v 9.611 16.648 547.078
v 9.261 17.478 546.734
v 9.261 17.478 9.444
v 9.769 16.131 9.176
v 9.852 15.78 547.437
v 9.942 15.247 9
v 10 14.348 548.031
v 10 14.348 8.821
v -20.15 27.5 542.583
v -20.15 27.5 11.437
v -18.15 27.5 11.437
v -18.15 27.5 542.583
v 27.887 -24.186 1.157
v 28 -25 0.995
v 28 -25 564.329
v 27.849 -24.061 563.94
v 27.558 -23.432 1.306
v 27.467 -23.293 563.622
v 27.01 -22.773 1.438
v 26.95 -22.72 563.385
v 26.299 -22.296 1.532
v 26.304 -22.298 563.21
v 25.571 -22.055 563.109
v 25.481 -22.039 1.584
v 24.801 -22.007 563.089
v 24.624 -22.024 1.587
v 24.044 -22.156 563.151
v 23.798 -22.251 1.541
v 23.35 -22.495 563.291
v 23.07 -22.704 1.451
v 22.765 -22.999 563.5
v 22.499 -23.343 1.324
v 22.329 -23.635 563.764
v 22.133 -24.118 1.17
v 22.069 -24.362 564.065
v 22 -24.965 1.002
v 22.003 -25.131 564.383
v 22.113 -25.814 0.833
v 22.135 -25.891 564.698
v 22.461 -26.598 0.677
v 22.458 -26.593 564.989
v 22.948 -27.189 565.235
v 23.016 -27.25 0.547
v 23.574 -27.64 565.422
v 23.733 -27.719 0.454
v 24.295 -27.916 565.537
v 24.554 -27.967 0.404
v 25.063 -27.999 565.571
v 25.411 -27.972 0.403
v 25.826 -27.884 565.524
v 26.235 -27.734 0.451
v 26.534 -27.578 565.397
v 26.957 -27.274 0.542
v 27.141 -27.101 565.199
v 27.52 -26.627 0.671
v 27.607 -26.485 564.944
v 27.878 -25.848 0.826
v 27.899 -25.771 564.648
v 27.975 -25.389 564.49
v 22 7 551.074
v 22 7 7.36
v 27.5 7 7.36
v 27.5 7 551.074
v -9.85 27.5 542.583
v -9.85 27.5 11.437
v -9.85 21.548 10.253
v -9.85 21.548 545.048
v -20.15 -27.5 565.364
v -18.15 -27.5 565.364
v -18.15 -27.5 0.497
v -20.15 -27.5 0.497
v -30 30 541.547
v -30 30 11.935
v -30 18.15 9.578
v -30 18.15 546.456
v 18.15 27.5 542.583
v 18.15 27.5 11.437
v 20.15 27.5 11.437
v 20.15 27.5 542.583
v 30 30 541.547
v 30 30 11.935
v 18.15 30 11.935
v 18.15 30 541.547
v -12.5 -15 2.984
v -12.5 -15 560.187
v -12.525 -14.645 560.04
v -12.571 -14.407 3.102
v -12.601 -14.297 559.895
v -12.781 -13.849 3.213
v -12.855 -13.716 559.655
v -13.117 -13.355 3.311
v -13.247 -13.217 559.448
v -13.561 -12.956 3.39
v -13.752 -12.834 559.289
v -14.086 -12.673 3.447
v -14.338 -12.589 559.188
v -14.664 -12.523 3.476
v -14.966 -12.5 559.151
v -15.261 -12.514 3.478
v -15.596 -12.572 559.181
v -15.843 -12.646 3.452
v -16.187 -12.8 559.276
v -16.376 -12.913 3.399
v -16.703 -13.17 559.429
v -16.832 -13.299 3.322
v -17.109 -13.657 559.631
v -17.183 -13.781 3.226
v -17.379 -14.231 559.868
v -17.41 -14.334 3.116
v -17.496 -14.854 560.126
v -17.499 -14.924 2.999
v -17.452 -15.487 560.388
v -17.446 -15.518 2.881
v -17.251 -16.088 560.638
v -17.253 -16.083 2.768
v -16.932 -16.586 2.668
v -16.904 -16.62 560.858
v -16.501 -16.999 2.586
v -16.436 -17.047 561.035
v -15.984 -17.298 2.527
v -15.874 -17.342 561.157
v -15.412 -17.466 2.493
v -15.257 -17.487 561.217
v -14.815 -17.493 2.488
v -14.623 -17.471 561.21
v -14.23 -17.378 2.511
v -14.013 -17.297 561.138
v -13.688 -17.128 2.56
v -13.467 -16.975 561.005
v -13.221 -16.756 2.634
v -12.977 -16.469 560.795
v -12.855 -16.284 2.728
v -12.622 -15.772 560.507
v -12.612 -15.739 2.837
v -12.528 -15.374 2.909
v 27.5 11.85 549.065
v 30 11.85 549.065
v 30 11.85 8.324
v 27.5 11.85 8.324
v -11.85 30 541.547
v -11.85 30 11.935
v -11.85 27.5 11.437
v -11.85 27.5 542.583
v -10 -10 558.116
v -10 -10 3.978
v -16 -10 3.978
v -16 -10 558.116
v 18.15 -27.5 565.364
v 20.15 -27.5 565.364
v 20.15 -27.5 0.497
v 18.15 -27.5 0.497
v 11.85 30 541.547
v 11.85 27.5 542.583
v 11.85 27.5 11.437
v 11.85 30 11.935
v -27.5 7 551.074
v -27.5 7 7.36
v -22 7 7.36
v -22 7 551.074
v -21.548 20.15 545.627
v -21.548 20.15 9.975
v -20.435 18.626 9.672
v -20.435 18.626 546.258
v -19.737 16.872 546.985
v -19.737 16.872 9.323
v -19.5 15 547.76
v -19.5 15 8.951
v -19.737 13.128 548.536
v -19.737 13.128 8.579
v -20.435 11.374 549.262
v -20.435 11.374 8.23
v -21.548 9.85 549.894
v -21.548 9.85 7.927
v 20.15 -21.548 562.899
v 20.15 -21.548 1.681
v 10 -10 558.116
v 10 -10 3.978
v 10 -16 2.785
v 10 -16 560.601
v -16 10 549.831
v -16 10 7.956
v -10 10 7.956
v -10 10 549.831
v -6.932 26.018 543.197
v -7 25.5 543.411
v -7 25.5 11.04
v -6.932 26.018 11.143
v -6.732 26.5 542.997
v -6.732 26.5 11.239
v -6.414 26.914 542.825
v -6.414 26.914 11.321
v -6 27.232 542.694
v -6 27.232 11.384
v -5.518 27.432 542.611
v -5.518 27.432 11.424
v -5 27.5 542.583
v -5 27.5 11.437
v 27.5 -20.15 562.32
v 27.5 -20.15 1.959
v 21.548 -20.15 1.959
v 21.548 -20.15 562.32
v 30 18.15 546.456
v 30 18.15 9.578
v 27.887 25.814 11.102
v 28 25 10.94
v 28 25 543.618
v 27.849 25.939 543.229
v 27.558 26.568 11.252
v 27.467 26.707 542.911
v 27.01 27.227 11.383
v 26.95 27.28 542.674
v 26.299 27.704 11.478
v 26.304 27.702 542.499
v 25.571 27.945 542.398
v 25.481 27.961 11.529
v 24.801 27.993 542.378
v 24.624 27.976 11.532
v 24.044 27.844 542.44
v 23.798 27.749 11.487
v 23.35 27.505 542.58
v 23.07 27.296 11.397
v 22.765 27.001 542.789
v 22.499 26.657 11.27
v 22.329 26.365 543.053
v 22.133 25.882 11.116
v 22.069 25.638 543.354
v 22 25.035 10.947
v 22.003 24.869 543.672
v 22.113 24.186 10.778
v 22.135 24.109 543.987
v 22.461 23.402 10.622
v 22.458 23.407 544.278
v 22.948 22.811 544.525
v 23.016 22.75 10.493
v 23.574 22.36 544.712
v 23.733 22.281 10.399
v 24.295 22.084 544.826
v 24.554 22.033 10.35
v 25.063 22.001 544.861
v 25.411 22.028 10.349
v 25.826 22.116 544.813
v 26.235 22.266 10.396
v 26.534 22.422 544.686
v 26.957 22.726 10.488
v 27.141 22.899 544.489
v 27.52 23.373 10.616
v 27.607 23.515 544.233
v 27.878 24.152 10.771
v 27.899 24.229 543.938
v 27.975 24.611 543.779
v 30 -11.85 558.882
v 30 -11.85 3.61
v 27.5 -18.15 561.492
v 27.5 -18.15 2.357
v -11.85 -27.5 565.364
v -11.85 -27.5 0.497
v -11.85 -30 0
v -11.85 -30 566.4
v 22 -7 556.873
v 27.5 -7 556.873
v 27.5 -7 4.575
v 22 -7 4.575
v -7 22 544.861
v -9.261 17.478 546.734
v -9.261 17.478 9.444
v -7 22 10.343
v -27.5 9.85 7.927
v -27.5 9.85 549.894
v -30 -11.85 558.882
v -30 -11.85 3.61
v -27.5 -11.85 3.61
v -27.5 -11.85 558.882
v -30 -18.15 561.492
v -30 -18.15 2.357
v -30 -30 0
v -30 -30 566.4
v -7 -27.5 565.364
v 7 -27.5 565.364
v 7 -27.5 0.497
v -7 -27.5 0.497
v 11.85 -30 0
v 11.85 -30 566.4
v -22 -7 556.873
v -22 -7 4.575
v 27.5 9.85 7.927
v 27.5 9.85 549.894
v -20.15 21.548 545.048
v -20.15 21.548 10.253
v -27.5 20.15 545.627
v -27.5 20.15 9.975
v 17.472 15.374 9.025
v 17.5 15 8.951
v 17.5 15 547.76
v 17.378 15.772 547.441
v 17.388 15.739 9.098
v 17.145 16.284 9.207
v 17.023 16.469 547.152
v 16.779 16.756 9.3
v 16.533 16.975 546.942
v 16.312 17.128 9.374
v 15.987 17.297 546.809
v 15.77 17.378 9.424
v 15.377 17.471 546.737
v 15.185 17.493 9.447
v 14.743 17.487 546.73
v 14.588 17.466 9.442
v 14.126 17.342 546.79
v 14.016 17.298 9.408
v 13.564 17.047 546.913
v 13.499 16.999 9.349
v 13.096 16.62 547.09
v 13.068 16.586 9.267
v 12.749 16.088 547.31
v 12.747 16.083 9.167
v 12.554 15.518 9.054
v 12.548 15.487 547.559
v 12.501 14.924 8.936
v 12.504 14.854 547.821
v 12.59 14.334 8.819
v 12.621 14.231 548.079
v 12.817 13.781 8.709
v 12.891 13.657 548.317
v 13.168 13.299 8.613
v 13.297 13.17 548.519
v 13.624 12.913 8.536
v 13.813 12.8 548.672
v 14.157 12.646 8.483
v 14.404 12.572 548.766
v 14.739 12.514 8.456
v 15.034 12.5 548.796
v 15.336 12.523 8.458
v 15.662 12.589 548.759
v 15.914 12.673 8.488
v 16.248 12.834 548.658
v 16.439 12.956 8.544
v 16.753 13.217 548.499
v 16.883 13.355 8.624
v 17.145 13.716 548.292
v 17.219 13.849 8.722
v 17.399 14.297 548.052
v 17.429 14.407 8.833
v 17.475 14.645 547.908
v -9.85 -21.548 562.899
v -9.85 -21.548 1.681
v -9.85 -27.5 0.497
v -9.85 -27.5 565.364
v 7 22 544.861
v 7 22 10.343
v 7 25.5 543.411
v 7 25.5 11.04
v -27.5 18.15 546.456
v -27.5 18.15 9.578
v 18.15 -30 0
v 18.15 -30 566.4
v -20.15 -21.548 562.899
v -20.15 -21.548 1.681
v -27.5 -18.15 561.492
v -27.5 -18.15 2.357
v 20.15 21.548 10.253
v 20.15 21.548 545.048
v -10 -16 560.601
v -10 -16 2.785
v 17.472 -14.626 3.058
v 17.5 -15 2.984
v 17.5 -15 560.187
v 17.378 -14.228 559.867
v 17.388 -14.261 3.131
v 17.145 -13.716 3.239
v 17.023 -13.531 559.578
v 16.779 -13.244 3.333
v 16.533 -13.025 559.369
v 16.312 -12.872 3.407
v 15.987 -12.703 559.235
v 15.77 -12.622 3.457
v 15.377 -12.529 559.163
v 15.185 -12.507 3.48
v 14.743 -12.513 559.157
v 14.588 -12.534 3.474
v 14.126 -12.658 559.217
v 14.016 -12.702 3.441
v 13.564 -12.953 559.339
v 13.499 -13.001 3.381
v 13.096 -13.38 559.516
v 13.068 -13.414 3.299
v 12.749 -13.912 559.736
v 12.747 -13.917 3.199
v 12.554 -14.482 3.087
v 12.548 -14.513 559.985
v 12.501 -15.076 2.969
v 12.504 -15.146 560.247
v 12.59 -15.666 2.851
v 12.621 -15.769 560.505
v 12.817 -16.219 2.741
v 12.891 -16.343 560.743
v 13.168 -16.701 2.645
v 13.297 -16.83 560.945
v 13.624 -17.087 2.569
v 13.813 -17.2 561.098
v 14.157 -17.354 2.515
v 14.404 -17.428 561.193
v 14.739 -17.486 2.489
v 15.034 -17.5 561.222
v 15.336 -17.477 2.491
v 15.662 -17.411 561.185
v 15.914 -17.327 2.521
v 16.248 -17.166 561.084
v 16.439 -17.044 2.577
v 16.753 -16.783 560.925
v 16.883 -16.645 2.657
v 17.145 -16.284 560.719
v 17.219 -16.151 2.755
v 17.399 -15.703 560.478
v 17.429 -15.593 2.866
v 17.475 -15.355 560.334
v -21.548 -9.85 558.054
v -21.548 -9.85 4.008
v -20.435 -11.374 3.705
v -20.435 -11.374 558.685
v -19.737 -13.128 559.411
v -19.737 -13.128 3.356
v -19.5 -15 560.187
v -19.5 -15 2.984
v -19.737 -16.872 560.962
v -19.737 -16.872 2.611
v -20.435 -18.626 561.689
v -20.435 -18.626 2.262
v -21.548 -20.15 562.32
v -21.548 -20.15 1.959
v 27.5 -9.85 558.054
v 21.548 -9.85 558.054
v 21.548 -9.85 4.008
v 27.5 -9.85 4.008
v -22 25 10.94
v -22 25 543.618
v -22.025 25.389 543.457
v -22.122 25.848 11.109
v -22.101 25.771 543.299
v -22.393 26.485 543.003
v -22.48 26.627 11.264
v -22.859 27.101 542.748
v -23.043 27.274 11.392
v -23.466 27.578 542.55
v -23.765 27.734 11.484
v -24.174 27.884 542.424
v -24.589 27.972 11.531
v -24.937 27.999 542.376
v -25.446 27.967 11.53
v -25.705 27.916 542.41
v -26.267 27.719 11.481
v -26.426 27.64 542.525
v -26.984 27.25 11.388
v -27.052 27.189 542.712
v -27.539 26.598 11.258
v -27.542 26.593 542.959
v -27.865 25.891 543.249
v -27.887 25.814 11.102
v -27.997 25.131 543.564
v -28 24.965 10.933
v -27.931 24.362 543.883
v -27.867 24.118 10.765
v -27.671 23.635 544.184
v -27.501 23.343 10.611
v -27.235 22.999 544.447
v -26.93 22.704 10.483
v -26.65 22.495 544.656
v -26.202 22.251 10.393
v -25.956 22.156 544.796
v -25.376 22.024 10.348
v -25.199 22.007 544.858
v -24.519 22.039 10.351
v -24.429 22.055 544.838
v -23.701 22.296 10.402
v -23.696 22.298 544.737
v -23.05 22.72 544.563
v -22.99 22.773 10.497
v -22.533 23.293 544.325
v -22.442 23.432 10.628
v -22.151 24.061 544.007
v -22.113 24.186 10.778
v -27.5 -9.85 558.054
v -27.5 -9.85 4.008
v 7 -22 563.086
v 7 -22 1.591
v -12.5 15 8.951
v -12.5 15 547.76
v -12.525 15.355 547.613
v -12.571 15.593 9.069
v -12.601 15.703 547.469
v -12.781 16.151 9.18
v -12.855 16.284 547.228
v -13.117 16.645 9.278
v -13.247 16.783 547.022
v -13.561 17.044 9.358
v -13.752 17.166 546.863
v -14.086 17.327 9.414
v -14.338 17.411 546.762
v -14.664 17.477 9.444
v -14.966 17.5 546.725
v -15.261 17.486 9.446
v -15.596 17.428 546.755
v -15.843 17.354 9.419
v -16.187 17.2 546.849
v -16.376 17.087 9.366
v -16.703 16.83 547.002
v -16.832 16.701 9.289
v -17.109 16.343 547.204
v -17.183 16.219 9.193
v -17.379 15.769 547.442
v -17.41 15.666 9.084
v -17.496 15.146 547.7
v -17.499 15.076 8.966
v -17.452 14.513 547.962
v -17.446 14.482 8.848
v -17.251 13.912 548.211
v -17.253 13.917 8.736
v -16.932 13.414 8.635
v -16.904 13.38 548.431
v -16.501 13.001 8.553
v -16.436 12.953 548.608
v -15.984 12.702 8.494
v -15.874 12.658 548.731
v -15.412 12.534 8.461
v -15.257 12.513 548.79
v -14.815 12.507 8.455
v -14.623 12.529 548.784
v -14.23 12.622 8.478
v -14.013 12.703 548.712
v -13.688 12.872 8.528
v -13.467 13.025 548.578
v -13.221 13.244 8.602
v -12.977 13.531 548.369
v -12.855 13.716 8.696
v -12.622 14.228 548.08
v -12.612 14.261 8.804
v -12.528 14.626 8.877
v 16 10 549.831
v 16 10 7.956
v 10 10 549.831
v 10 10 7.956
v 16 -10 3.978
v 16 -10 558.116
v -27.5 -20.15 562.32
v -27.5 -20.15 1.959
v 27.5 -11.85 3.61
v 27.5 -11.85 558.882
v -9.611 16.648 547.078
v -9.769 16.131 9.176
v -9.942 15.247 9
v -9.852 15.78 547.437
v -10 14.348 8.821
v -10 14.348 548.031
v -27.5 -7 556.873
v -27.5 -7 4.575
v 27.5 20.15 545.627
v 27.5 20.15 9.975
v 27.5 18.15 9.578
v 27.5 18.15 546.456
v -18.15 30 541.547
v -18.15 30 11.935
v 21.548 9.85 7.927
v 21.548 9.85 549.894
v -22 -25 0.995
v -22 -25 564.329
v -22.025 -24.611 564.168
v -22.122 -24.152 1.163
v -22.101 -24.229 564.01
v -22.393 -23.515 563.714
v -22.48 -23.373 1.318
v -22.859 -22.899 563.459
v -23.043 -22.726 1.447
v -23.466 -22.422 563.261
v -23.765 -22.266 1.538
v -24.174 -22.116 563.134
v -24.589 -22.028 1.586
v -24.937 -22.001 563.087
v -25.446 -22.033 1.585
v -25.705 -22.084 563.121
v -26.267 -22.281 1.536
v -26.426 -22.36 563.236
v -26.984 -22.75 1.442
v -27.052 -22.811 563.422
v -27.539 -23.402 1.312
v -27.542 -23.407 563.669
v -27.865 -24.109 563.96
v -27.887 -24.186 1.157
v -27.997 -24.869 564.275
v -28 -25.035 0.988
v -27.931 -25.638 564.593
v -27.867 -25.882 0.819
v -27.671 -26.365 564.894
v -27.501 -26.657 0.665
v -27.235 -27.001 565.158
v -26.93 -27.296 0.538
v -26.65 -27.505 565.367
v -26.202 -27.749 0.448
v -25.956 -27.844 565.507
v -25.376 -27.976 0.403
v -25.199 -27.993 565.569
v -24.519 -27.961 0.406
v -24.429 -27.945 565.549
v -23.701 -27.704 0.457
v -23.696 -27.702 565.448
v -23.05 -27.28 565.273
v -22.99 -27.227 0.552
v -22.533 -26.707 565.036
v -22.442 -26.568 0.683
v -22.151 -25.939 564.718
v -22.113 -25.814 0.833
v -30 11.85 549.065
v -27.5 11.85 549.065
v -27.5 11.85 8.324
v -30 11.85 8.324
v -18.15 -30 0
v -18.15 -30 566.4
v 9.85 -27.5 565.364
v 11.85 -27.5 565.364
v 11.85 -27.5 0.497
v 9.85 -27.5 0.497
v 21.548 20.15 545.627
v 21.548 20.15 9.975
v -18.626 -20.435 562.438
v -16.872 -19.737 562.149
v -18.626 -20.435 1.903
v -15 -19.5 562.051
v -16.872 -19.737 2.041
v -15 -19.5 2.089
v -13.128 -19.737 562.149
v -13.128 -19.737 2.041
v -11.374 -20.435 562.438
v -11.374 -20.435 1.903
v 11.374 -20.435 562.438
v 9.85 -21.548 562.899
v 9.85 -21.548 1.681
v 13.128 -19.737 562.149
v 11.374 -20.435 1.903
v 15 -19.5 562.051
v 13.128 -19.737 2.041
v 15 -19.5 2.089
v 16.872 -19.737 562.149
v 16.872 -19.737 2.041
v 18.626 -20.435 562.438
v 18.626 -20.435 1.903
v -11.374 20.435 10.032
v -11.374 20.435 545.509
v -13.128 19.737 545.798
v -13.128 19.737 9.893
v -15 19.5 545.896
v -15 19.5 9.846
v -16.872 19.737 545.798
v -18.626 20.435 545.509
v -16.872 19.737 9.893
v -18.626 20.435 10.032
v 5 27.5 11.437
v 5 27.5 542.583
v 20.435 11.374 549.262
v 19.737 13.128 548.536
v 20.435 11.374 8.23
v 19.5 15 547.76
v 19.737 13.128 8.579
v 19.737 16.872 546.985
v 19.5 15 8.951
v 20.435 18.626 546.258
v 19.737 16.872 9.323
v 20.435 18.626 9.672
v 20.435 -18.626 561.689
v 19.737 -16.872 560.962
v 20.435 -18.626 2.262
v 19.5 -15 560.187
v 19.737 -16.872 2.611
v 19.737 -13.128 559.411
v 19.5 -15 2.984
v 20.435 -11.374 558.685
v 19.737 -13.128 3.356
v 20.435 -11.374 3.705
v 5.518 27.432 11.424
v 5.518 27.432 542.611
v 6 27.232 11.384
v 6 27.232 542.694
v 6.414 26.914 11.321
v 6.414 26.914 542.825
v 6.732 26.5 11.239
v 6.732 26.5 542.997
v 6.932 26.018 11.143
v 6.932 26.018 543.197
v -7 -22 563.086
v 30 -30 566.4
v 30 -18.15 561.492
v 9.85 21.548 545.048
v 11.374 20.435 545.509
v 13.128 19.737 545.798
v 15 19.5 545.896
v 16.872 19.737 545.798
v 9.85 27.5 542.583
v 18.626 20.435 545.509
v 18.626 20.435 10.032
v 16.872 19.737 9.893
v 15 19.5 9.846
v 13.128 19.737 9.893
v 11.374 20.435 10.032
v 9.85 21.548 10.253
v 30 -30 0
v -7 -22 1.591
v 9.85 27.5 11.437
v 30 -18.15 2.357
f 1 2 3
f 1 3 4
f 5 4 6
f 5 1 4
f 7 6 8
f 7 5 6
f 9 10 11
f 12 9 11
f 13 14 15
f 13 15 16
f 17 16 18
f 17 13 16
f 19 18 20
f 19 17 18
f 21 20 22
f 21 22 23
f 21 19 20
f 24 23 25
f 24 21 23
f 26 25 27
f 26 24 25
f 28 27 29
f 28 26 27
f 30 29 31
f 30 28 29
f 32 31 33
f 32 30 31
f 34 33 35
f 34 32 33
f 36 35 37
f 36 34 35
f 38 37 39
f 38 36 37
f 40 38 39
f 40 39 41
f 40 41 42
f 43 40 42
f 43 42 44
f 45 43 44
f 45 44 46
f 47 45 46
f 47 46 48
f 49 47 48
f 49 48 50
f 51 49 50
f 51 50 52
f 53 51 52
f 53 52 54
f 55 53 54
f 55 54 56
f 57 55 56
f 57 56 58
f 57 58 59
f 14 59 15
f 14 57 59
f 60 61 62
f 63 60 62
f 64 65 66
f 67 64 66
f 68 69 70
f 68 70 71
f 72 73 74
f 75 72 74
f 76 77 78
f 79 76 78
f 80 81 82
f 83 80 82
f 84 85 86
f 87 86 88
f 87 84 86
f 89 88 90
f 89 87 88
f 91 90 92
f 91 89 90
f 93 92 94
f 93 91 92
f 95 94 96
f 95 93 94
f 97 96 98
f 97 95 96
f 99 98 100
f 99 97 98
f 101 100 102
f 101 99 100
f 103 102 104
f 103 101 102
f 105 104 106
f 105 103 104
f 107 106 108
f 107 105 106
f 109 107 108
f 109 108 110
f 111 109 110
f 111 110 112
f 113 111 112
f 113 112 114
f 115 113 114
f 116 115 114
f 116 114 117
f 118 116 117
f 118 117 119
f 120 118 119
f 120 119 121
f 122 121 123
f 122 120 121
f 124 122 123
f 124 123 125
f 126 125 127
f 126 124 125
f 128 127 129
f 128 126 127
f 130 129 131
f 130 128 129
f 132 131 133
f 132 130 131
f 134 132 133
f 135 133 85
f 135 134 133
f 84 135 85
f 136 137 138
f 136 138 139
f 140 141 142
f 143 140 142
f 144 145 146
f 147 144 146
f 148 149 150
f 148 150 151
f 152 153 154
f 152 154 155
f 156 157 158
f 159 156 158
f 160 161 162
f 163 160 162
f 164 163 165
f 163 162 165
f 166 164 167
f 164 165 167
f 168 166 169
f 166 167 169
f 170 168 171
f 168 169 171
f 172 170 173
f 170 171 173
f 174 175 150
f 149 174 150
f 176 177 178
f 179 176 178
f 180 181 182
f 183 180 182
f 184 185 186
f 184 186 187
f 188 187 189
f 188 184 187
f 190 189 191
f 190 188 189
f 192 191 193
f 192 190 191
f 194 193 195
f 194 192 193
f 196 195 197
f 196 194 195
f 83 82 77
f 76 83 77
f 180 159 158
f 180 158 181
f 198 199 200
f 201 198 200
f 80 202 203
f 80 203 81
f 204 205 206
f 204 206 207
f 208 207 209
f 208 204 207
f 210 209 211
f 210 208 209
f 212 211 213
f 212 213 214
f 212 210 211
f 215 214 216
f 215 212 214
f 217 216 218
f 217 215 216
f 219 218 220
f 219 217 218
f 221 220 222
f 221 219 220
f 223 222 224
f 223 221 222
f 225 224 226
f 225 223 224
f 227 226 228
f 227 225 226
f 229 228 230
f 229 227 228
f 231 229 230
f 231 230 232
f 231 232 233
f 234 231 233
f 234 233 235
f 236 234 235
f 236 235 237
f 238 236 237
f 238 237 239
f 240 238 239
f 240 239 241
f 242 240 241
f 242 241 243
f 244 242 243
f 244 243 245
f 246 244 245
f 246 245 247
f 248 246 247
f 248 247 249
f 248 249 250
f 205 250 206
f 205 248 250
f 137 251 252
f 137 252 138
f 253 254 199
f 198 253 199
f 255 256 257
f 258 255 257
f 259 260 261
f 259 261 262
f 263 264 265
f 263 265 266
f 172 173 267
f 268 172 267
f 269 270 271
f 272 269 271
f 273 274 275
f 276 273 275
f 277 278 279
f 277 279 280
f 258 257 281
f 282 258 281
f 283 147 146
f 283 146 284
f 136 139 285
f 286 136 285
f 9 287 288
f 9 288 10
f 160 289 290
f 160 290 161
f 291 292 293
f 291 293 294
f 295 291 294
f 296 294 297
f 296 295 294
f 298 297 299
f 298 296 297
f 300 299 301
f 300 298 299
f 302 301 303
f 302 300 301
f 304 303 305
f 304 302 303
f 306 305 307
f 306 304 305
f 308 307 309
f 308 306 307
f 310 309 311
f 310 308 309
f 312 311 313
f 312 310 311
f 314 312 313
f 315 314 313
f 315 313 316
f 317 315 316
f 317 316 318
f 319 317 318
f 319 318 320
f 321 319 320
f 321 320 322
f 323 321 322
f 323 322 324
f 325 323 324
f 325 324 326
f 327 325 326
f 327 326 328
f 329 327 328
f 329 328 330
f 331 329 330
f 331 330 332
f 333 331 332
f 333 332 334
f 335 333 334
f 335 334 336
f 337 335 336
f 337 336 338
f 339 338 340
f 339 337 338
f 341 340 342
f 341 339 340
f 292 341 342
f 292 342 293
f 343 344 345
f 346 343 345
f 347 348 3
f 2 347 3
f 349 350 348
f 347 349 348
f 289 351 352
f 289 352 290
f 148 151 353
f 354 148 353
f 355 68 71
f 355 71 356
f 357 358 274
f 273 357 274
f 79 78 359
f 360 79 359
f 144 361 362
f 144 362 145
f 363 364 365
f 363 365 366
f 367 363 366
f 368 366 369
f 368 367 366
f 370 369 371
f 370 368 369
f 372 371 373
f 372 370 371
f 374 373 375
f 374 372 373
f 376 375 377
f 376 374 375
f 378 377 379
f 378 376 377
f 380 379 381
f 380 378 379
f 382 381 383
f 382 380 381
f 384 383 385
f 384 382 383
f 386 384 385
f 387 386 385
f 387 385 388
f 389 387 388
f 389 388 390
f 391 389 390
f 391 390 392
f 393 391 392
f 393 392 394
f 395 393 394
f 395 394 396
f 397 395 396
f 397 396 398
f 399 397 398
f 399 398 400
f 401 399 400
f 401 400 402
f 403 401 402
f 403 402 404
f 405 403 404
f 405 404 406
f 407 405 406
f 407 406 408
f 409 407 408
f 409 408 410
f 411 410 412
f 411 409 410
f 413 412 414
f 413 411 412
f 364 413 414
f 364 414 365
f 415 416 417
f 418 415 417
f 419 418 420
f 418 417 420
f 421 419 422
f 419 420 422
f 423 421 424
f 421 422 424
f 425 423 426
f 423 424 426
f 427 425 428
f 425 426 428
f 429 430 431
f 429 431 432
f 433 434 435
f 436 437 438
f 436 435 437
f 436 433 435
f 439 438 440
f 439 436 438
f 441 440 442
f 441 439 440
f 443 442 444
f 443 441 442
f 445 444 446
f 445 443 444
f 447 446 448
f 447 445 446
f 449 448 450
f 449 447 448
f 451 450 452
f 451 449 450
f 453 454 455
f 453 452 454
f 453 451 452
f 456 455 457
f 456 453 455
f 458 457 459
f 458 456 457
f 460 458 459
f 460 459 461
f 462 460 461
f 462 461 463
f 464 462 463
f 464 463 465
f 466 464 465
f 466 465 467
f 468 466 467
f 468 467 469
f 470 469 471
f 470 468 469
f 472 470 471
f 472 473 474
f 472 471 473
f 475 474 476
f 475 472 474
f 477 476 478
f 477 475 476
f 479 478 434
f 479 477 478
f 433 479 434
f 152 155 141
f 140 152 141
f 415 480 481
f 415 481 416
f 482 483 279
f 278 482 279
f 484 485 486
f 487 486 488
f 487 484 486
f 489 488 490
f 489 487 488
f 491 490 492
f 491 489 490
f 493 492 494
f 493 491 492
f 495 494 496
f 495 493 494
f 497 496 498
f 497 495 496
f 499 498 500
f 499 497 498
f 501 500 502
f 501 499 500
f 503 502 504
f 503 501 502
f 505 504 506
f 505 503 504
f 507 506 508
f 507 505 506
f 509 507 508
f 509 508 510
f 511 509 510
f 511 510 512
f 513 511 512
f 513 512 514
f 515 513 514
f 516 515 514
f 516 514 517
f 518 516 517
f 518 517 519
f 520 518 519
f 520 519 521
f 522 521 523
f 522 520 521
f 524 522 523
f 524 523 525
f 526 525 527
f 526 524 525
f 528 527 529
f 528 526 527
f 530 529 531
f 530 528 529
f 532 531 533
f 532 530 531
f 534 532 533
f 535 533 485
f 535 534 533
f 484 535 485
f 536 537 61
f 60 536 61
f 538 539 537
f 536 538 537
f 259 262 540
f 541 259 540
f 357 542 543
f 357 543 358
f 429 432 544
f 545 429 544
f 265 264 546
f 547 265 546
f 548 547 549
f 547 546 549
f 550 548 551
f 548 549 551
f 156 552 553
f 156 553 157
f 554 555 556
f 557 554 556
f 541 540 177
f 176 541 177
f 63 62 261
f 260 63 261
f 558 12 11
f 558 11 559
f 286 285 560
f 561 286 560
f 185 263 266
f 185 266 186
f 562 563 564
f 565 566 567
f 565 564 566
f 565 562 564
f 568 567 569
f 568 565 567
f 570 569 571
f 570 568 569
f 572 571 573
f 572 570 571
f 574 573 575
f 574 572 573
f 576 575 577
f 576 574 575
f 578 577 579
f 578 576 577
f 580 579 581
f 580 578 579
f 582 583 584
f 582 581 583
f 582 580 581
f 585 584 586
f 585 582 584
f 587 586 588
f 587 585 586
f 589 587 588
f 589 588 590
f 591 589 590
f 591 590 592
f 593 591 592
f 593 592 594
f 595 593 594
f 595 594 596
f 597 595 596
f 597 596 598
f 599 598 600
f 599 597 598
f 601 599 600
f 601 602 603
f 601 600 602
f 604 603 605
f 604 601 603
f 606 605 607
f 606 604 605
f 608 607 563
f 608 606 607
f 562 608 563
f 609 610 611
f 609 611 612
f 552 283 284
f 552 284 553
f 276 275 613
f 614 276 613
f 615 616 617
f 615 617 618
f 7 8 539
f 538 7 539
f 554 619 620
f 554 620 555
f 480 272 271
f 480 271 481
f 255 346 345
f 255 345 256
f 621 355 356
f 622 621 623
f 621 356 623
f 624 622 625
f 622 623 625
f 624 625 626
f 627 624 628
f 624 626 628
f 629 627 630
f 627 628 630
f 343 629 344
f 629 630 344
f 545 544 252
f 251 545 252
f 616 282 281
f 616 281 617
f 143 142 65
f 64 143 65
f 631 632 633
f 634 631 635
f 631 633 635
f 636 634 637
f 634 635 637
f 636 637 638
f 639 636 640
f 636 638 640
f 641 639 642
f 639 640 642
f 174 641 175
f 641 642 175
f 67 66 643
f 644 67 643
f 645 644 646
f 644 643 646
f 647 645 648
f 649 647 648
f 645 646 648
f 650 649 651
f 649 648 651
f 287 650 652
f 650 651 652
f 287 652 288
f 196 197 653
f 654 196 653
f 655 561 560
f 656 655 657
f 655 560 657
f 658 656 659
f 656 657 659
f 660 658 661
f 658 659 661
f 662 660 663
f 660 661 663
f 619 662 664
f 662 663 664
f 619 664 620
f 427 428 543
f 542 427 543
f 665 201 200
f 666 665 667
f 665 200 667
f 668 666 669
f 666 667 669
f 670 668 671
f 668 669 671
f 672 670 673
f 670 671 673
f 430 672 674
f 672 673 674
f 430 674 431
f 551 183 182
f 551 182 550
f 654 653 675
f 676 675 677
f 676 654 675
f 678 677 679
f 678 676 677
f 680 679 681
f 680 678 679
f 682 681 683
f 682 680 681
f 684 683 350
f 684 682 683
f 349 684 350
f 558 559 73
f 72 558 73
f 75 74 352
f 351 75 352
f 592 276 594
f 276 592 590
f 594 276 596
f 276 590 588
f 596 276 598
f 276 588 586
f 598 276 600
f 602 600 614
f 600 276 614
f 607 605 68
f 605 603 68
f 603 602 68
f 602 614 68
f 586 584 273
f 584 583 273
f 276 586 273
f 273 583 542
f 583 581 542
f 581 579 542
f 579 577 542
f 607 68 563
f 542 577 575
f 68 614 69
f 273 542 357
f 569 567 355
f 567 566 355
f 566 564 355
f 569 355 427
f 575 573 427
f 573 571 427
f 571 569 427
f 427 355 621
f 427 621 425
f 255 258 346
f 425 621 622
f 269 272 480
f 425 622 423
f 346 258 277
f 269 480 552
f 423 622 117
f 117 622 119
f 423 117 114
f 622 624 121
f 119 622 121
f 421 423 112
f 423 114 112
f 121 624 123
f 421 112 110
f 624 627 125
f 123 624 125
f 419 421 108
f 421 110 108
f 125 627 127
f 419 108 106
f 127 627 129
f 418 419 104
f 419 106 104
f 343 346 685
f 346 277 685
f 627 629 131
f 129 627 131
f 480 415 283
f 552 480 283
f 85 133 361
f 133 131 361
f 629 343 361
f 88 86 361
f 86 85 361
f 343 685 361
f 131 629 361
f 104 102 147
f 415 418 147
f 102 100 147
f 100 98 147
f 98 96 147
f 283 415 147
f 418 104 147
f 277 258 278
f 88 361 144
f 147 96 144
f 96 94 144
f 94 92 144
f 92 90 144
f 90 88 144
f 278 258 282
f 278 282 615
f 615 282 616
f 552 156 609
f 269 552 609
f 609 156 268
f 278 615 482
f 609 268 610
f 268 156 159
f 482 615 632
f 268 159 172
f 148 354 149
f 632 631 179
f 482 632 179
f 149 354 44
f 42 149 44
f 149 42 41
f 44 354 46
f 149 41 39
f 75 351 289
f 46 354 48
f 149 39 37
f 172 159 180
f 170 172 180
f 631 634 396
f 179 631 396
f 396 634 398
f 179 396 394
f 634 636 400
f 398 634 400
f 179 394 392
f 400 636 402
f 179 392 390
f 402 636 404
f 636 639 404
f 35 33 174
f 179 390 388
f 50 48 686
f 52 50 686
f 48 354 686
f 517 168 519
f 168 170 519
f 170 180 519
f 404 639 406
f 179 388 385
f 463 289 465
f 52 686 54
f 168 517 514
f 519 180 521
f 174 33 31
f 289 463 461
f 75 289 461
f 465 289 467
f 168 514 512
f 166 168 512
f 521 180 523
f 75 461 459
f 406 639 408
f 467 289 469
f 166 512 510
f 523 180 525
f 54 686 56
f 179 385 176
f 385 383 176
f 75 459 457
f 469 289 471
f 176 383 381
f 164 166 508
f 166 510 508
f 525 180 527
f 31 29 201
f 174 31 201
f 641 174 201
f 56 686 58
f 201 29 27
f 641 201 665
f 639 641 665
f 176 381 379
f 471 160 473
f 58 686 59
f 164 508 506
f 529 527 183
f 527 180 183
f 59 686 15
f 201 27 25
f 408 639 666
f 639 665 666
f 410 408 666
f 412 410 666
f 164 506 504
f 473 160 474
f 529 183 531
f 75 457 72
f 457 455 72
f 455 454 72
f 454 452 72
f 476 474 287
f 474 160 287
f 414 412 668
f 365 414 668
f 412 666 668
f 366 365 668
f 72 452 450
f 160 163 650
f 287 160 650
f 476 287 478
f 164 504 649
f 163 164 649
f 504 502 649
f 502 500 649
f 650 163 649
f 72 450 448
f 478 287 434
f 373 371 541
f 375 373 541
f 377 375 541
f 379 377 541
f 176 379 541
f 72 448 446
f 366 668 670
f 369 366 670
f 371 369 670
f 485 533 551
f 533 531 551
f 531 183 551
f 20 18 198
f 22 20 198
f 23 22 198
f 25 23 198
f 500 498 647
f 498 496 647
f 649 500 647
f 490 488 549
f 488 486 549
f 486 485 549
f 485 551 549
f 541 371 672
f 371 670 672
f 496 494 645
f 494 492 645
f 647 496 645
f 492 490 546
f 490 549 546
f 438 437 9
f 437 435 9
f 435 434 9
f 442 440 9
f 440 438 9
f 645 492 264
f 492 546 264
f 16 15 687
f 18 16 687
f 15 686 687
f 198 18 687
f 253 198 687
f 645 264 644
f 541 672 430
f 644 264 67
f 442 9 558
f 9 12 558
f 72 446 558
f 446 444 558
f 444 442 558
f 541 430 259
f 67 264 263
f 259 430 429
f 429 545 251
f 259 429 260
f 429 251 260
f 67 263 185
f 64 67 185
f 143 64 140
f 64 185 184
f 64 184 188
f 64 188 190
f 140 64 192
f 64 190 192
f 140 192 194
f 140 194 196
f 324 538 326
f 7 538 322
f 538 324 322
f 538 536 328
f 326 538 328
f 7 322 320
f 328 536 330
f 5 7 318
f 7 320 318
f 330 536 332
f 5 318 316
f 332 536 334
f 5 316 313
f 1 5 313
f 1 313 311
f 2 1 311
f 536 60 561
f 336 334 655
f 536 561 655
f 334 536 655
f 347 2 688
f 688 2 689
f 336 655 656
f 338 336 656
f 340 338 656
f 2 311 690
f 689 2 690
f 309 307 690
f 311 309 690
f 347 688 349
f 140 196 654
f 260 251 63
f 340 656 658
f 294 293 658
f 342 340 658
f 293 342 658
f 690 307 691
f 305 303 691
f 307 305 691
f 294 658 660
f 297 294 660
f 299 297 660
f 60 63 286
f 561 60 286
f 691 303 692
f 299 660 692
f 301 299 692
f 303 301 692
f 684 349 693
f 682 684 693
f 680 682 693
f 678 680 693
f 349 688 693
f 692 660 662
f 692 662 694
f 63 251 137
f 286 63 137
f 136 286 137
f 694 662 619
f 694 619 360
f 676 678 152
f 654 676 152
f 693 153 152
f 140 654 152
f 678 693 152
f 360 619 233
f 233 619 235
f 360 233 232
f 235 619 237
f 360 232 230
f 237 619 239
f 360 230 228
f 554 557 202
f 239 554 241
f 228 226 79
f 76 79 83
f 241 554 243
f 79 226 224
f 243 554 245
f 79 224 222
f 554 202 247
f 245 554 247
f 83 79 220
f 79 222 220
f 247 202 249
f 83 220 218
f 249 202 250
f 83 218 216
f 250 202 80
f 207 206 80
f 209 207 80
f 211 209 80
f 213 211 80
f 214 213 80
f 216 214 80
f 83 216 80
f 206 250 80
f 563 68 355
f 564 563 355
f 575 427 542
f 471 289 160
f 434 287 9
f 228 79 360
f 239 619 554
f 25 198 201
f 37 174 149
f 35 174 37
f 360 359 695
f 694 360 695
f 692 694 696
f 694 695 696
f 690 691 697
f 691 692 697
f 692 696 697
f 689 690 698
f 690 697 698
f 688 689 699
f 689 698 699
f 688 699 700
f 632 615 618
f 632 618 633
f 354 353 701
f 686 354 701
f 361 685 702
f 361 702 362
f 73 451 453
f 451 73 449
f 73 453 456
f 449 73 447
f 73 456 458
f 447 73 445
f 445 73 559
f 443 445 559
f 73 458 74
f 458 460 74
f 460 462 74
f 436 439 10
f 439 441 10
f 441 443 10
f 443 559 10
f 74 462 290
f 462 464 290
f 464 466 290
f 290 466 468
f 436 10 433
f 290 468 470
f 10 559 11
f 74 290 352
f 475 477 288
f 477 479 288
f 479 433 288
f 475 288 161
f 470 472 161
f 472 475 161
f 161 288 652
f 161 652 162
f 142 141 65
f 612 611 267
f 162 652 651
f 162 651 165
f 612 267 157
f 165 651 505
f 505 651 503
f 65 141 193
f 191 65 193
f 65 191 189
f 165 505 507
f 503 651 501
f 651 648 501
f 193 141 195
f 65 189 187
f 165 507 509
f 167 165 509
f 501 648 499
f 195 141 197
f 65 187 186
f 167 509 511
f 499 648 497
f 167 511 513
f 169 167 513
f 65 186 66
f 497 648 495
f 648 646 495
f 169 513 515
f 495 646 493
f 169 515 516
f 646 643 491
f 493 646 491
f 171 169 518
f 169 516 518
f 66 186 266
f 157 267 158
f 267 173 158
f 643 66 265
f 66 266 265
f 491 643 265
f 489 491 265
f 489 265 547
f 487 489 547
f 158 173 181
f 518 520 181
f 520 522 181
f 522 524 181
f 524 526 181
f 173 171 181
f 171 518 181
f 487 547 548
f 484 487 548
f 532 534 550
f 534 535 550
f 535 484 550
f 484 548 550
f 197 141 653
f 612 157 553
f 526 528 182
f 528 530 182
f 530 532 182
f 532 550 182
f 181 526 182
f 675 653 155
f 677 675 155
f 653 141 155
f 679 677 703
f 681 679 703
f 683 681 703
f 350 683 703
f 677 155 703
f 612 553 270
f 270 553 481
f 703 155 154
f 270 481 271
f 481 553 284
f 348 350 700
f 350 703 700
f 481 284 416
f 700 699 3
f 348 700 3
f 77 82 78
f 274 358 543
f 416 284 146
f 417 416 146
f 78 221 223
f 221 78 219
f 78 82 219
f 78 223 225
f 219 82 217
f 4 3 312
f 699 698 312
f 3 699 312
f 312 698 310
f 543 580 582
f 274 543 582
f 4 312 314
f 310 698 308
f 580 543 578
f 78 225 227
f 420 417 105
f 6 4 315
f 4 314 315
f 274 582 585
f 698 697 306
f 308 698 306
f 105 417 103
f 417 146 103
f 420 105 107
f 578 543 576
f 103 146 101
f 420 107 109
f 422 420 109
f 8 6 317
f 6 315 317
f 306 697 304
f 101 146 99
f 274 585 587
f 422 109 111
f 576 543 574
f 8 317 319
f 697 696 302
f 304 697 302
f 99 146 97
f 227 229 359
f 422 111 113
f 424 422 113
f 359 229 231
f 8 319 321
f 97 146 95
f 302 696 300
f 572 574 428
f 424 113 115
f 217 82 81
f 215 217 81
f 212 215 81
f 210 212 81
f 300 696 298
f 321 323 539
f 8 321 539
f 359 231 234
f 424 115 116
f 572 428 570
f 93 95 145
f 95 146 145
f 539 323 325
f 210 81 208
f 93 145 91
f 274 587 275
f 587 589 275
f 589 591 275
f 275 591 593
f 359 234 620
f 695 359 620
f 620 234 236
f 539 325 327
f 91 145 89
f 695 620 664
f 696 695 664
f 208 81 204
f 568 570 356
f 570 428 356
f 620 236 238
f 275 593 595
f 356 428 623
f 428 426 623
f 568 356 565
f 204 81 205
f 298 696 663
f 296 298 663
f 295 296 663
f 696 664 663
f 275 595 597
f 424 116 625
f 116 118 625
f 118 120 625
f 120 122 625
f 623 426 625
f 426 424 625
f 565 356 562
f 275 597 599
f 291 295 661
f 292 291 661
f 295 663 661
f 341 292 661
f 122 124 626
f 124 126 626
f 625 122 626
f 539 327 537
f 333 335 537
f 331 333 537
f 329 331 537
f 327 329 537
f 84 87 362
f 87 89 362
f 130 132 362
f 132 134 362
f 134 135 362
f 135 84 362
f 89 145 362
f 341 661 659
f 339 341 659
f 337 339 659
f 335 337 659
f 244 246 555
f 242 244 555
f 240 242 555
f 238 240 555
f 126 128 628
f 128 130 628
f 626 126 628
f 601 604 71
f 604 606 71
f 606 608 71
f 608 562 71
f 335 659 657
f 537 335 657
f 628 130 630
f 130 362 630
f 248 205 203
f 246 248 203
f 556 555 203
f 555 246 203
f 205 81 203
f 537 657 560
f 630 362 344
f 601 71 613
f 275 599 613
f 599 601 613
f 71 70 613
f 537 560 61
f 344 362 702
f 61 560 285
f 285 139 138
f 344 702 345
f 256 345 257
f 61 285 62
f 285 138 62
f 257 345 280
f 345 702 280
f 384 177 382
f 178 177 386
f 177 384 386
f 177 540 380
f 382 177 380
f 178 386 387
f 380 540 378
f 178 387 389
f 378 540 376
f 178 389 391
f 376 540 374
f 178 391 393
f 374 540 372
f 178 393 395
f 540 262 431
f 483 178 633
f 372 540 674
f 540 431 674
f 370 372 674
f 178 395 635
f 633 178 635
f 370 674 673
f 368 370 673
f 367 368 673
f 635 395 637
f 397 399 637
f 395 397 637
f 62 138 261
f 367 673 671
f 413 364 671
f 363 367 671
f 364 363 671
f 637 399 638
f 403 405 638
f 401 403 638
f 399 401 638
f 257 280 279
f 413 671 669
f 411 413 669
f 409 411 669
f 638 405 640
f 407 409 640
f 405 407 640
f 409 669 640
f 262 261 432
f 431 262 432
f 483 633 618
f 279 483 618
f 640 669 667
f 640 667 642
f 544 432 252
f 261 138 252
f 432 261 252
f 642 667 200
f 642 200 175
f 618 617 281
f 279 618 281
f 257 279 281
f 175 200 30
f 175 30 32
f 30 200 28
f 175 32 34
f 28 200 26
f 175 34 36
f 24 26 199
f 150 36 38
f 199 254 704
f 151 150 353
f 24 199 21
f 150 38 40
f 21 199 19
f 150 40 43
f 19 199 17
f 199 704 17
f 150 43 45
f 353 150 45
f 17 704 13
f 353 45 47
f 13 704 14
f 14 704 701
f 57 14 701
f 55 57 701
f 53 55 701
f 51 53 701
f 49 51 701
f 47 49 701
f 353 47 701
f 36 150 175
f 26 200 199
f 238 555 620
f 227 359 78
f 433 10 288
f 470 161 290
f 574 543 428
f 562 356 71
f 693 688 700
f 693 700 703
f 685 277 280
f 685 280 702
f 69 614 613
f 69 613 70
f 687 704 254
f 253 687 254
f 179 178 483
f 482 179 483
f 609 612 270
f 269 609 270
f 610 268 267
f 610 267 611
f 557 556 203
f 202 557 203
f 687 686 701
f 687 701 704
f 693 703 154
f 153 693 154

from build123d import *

# Parameters (mm, degrees)
F0_R          = 3
F0_R_2        = 2.5
F1_DEPTH      = 566.4
F2_R          = 2
F3_R          = 7
F6_DEPTH      = 30
F6_DEPTH_BACK = 30


# Not quite as in the source:
# - a feature names something its author has since deleted; it is built from what else it names


with BuildPart() as f1:
    # F0 (on Top) → F1 (new body)
    with BuildSketch(Plane.XY):
        with BuildLine():
            Line((18.15, -30), (30, -30))
            Line((30, -30), (30, -18.15))
            Line((30, -18.15), (27.5, -18.15))
            Line((27.5, -18.15), (27.5, -20.15))
            Line((27.5, -20.15), (21.5477069044, -20.15))
            ThreePointArc((21.5477069044, -20.15), (19.5, -15), (21.5477069044, -9.85))
            Line((21.5477069044, -9.85), (27.5, -9.85))
            Line((27.5, -9.85), (27.5, -11.85))
            Line((27.5, -11.85), (30, -11.85))
            Line((30, -11.85), (30, 11.85))
            Line((30, 11.85), (27.5, 11.85))
            Line((27.5, 11.85), (27.5, 9.85))
            Line((27.5, 9.85), (21.5477069044, 9.85))
            ThreePointArc((21.5477069044, 9.85), (19.5, 15), (21.5477069044, 20.15))
            Line((21.5477069044, 20.15), (27.5, 20.15))
            Line((27.5, 20.15), (27.5, 18.15))
            Line((27.5, 18.15), (30, 18.15))
            Line((30, 18.15), (30, 30))
            Line((30, 30), (18.15, 30))
            Line((18.15, 30), (18.15, 27.5))
            Line((18.15, 27.5), (20.15, 27.5))
            Line((20.15, 27.5), (20.15, 21.5477069044))
            ThreePointArc((20.15, 21.5477069044), (15, 19.5), (9.85, 21.5477069044))
            Line((9.85, 21.5477069044), (9.85, 27.5))
            Line((9.85, 27.5), (11.85, 27.5))
            Line((11.85, 27.5), (11.85, 30))
            Line((11.85, 30), (-11.85, 30))
            Line((-11.85, 30), (-11.85, 27.5))
            Line((-11.85, 27.5), (-9.85, 27.5))
            Line((-9.85, 27.5), (-9.85, 21.5477069044))
            ThreePointArc((-9.85, 21.5477069044), (-15, 19.5), (-20.15, 21.5477069044))
            Line((-20.15, 21.5477069044), (-20.15, 27.5))
            Line((-20.15, 27.5), (-18.15, 27.5))
            Line((-18.15, 27.5), (-18.15, 30))
            Line((-18.15, 30), (-30, 30))
            Line((-30, 30), (-30, 18.15))
            Line((-30, 18.15), (-27.5, 18.15))
            Line((-27.5, 18.15), (-27.5, 20.15))
            Line((-27.5, 20.15), (-21.5477069044, 20.15))
            ThreePointArc((-21.5477069044, 20.15), (-19.5, 15), (-21.5477069044, 9.85))
            Line((-21.5477069044, 9.85), (-27.5, 9.85))
            Line((-27.5, 9.85), (-27.5, 11.85))
            Line((-27.5, 11.85), (-30, 11.85))
            Line((-30, 11.85), (-30, -11.85))
            Line((-30, -11.85), (-27.5, -11.85))
            Line((-27.5, -11.85), (-27.5, -9.85))
            Line((-27.5, -9.85), (-21.5477069044, -9.85))
            ThreePointArc((-21.5477069044, -9.85), (-19.5, -15), (-21.5477069044, -20.15))
            Line((-21.5477069044, -20.15), (-27.5, -20.15))
            Line((-27.5, -20.15), (-27.5, -18.15))
            Line((-27.5, -18.15), (-30, -18.15))
            Line((-30, -18.15), (-30, -30))
            Line((-30, -30), (-18.15, -30))
            Line((-18.15, -30), (-18.15, -27.5))
            Line((-18.15, -27.5), (-20.15, -27.5))
            Line((-20.15, -27.5), (-20.15, -21.5477069044))
            ThreePointArc((-20.15, -21.5477069044), (-15, -19.5), (-9.85, -21.5477069044))
            Line((-9.85, -21.5477069044), (-9.85, -27.5))
            Line((-9.85, -27.5), (-11.85, -27.5))
            Line((-11.85, -27.5), (-11.85, -30))
            Line((-11.85, -30), (11.85, -30))
            Line((11.85, -30), (11.85, -27.5))
            Line((11.85, -27.5), (9.85, -27.5))
            Line((9.85, -27.5), (9.85, -21.5477069044))
            ThreePointArc((9.85, -21.5477069044), (15, -19.5), (20.15, -21.5477069044))
            Line((20.15, -21.5477069044), (20.15, -27.5))
            Line((20.15, -27.5), (18.15, -27.5))
            Line((18.15, -27.5), (18.15, -30))
        make_face()
        with Locations((-25, -25)):
            Circle(F0_R, mode=Mode.SUBTRACT)
        with Locations((-15, -15)):
            Circle(F0_R_2, mode=Mode.SUBTRACT)
        with Locations((25, -25)):
            Circle(F0_R, mode=Mode.SUBTRACT)
        with Locations((15, -15)):
            Circle(F0_R_2, mode=Mode.SUBTRACT)
        with Locations((-25, 25)):
            Circle(F0_R, mode=Mode.SUBTRACT)
        with Locations((-15, 15)):
            Circle(F0_R_2, mode=Mode.SUBTRACT)
        Polygon((-7, 22), (-7, 27.5), (0, 27.5), (7, 27.5), (7, 22), (10, 16), (10, 10), (16, 10), (22, 7), (27.5, 7), (27.5, 0), (27.5, -7), (22, -7), (16, -10), (10, -10), (10, -16), (7, -22), (7, -27.5), (0, -27.5), (-7, -27.5), (-7, -22), (-10, -16), (-10, -10), (-16, -10), (-22, -7), (-27.5, -7), (-27.5, 0), (-27.5, 7), (-22, 7), (-16, 10), (-10, 10), (-10, 16), align=None, mode=Mode.SUBTRACT)
        with Locations((15, 15)):
            Circle(F0_R_2, mode=Mode.SUBTRACT)
        with Locations((25, 25)):
            Circle(F0_R, mode=Mode.SUBTRACT)
    extrude(amount=F1_DEPTH)

    # F2
    f2_edges = [f1.edges().sort_by_distance(p)[0] for p in [
        (-7, 27.5, 283.2),
        (7, 27.5, 283.2),
    ]]
    fillet(f2_edges, radius=F2_R)

    # F3
    f3_edges = [f1.edges().sort_by_distance(p)[0] for p in [
        (-10, 16, 283.2),
        (10, 16, 283.2),
    ]]
    fillet(f3_edges, radius=F3_R)

    # F5 (on Right) → F6 (cut, two sides)
    with BuildSketch(Plane.YZ) as f6_sk:
        Polygon((-5.9431682558, -120.9418602831), (191.6672123159, -81.6347116648), (167.6103805717, 39.3071486183), (-30, 0), align=None)
        Polygon((112.1150393779, 507.5340232725), (142.1183047075, 579.9683133465), (0.0032653295, 638.834290074), (-30, 566.4), align=None)
    extrude(amount=F6_DEPTH, mode=Mode.SUBTRACT)
    extrude(f6_sk.sketch, amount=-F6_DEPTH_BACK, mode=Mode.SUBTRACT)


solid = f1.part
